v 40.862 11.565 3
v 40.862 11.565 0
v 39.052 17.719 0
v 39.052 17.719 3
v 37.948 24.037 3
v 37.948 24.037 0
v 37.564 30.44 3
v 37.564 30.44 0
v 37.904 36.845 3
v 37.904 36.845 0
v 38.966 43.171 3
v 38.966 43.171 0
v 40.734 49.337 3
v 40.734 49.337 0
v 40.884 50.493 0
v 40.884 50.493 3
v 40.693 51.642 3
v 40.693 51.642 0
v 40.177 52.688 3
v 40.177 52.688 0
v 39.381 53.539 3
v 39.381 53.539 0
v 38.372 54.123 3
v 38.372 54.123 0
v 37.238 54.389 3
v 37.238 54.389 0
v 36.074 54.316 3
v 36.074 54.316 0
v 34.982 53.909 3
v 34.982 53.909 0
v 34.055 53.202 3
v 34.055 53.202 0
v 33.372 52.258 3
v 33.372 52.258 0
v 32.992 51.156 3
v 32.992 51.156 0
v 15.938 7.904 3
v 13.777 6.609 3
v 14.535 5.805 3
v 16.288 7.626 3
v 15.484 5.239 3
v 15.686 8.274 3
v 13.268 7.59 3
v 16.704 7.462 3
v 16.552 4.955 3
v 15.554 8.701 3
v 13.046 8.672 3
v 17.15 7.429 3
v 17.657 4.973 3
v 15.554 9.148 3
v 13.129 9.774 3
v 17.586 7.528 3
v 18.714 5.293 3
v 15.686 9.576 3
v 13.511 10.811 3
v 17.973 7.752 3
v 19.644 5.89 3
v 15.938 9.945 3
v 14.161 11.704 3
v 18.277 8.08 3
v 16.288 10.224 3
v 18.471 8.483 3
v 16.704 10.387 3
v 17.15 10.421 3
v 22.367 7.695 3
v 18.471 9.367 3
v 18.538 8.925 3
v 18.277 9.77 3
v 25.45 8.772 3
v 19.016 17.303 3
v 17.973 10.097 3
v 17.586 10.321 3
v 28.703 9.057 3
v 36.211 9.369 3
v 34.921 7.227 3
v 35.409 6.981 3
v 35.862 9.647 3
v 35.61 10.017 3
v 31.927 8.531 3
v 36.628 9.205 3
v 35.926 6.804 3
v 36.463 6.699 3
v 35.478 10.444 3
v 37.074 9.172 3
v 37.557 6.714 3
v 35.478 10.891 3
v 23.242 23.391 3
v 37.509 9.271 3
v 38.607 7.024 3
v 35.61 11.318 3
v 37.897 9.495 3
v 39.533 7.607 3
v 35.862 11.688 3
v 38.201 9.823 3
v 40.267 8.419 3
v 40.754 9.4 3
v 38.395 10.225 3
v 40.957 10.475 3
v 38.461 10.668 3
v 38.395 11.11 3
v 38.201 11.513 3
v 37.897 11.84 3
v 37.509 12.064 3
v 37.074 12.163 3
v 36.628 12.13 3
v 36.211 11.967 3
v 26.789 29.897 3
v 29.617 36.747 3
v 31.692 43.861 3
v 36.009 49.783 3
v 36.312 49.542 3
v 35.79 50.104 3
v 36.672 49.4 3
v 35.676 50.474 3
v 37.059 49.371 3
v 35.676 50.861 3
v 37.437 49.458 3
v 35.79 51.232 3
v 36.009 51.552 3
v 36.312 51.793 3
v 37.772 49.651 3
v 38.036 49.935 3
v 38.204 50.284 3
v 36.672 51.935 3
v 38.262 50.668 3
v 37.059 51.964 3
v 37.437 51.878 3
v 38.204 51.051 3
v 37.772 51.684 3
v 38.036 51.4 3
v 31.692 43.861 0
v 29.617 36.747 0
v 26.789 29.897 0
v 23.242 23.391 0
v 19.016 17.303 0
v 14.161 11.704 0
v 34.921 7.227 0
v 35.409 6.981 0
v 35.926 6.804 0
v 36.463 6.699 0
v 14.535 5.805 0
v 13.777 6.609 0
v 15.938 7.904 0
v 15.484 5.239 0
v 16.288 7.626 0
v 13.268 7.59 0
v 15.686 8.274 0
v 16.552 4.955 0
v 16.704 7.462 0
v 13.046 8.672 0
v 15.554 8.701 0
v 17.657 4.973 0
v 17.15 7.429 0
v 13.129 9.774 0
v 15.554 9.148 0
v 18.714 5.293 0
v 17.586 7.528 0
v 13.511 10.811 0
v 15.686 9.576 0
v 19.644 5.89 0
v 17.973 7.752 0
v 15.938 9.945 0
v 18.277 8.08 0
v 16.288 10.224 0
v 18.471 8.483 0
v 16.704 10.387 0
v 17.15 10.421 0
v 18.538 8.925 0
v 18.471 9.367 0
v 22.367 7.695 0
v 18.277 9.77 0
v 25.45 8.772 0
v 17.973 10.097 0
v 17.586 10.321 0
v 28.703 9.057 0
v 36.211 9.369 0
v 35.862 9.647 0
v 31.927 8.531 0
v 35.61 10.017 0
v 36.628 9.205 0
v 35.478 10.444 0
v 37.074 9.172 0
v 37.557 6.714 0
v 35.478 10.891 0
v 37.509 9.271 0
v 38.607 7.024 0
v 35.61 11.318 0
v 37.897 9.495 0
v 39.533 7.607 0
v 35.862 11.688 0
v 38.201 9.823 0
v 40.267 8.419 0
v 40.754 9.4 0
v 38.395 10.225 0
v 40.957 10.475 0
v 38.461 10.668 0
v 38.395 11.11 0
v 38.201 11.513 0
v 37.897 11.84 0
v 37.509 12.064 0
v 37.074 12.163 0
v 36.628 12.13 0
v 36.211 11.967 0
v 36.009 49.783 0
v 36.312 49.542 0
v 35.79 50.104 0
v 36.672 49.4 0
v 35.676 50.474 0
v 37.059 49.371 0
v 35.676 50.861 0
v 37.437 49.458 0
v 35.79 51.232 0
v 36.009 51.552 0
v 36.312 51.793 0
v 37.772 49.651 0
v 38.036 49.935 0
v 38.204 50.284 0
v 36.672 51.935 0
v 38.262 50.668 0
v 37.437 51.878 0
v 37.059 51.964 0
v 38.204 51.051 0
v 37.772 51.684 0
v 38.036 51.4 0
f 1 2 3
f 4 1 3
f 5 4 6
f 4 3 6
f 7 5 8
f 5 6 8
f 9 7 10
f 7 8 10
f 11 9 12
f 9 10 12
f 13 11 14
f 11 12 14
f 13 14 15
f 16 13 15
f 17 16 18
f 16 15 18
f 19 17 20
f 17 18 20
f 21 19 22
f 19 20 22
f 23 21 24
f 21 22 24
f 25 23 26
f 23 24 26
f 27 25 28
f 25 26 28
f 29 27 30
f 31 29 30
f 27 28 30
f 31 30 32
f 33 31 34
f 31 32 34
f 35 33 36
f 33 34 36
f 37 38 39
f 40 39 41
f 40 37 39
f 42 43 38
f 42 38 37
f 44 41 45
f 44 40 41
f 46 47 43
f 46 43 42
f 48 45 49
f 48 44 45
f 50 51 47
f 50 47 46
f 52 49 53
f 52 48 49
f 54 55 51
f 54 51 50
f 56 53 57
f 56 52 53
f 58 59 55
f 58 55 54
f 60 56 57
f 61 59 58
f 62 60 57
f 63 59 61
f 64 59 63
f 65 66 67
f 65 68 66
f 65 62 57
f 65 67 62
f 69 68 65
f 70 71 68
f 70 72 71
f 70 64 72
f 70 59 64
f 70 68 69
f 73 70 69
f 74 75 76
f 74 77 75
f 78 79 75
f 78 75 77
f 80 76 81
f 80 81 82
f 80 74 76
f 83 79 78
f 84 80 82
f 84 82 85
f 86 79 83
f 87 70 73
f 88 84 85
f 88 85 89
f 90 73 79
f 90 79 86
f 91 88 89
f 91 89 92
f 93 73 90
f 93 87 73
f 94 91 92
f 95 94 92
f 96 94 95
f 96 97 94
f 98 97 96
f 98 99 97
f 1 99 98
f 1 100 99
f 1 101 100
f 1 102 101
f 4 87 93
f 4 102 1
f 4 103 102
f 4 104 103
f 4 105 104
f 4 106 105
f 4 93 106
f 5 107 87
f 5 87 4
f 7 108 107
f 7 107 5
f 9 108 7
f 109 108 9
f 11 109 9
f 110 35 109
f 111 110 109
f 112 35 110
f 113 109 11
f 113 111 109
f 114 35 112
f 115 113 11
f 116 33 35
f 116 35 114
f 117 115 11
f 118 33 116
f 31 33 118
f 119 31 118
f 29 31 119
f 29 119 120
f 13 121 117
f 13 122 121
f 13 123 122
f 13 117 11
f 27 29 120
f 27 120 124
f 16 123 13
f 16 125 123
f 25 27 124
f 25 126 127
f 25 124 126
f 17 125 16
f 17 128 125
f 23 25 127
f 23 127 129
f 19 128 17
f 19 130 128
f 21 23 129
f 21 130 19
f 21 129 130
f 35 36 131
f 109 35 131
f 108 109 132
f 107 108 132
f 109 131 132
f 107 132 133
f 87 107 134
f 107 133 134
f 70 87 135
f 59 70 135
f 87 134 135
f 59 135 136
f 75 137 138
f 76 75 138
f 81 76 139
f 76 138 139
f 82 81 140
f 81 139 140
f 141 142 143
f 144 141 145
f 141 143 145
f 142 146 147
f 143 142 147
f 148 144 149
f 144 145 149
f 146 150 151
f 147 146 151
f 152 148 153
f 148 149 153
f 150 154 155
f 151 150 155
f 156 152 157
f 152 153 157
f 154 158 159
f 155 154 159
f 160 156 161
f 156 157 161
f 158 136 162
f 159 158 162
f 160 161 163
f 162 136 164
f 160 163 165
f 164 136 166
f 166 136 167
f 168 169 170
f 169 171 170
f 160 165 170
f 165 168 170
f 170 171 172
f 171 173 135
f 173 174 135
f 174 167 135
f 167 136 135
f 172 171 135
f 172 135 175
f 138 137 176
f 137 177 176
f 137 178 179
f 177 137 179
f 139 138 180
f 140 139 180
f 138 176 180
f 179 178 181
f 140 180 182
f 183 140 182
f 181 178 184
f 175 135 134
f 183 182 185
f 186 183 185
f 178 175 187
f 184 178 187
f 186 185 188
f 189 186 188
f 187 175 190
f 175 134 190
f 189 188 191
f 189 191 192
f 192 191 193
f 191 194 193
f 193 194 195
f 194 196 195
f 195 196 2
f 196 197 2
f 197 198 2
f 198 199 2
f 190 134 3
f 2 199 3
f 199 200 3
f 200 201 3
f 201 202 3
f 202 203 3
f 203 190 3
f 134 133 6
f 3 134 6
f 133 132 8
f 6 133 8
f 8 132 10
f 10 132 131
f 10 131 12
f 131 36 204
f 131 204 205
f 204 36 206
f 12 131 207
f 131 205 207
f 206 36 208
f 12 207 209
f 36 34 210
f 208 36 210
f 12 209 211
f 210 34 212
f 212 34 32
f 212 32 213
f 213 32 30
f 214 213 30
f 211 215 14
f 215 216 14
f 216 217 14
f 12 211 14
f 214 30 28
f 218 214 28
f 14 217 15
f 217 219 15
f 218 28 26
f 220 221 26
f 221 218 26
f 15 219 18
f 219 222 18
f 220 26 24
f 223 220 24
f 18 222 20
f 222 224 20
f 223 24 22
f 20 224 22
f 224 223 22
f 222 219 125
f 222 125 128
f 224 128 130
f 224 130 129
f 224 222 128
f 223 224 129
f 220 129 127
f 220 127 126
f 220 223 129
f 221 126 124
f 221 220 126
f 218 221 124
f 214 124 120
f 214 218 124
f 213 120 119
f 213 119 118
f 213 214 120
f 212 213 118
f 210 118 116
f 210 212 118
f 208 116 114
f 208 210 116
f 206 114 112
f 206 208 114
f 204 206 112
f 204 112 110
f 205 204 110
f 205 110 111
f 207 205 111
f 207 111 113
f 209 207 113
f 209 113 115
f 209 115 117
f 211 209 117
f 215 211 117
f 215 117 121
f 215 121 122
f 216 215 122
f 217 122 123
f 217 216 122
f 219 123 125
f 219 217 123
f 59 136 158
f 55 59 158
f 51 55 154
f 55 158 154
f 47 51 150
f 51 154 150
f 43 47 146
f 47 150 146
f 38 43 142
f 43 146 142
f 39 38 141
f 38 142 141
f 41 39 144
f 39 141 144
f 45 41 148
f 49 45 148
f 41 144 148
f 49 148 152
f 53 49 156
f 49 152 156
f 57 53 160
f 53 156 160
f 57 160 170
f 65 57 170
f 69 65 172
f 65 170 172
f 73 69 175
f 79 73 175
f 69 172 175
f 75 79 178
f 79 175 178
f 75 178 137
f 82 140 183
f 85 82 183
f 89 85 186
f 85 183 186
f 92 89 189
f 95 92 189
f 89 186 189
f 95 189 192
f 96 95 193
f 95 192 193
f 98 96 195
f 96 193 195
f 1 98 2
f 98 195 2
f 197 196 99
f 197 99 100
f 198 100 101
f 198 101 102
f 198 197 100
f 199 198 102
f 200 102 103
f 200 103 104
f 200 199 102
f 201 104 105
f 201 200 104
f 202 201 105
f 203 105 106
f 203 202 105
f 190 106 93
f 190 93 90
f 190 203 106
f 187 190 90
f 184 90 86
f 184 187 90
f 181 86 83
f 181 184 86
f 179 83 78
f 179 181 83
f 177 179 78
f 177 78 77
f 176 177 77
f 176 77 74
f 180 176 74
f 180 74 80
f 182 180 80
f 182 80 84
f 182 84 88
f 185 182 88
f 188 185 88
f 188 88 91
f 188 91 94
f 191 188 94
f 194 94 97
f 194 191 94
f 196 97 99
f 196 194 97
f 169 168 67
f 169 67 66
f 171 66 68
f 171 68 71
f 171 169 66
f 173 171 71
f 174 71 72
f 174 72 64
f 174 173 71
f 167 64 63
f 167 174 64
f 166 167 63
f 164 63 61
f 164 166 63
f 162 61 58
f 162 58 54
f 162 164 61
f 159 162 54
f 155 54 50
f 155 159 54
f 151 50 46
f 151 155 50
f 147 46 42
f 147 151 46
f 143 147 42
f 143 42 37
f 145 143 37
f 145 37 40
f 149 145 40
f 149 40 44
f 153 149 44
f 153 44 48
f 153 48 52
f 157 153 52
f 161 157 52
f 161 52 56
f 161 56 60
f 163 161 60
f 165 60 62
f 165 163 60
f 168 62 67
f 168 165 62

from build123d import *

# Parameters (mm, degrees)
MODEL_R             = 1.3
MODEL_R_2           = 1.5
BOSS_EXTRUDE1_DEPTH = 3


with BuildPart() as part:
    # Model → Boss-Extrude1 (new body)
    with BuildSketch(Plane.XY):
        with BuildLine():
            ThreePointArc((14.161227702, 11.70429003), (14.127993258, 6.180717338), (19.644033131, 5.890434821))
            ThreePointArc((19.644033131, 5.890434821), (27.067718512, 9.016008339), (34.921377151, 7.227053216))
            ThreePointArc((34.921377151, 7.227053216), (35.664878745, 6.883684708), (36.462728707, 6.698936254))
            ThreePointArc((36.462728707, 6.698936254), (39.928001734, 7.988038053), (40.861936188, 11.565420761))
            ThreePointArc((40.861936188, 11.565420761), (37.563797473, 30.440091822), (40.733692306, 49.336723623))
            ThreePointArc((40.733692306, 49.336723623), (37.814731301, 54.297590711), (32.991594421, 51.15627152))
            ThreePointArc((32.991594421, 51.15627152), (26.788825125, 29.897000757), (14.161227702, 11.70429003))
        make_face()
        with Locations((36.961607348, 50.667664276)):
            Circle(MODEL_R, mode=Mode.SUBTRACT)
        with Locations((17.037547355, 8.924717563)):
            Circle(MODEL_R_2, mode=Mode.SUBTRACT)
        with Locations((36.961484604, 10.667620763)):
            Circle(MODEL_R_2, mode=Mode.SUBTRACT)
    extrude(amount=BOSS_EXTRUDE1_DEPTH)


solid = part.part
